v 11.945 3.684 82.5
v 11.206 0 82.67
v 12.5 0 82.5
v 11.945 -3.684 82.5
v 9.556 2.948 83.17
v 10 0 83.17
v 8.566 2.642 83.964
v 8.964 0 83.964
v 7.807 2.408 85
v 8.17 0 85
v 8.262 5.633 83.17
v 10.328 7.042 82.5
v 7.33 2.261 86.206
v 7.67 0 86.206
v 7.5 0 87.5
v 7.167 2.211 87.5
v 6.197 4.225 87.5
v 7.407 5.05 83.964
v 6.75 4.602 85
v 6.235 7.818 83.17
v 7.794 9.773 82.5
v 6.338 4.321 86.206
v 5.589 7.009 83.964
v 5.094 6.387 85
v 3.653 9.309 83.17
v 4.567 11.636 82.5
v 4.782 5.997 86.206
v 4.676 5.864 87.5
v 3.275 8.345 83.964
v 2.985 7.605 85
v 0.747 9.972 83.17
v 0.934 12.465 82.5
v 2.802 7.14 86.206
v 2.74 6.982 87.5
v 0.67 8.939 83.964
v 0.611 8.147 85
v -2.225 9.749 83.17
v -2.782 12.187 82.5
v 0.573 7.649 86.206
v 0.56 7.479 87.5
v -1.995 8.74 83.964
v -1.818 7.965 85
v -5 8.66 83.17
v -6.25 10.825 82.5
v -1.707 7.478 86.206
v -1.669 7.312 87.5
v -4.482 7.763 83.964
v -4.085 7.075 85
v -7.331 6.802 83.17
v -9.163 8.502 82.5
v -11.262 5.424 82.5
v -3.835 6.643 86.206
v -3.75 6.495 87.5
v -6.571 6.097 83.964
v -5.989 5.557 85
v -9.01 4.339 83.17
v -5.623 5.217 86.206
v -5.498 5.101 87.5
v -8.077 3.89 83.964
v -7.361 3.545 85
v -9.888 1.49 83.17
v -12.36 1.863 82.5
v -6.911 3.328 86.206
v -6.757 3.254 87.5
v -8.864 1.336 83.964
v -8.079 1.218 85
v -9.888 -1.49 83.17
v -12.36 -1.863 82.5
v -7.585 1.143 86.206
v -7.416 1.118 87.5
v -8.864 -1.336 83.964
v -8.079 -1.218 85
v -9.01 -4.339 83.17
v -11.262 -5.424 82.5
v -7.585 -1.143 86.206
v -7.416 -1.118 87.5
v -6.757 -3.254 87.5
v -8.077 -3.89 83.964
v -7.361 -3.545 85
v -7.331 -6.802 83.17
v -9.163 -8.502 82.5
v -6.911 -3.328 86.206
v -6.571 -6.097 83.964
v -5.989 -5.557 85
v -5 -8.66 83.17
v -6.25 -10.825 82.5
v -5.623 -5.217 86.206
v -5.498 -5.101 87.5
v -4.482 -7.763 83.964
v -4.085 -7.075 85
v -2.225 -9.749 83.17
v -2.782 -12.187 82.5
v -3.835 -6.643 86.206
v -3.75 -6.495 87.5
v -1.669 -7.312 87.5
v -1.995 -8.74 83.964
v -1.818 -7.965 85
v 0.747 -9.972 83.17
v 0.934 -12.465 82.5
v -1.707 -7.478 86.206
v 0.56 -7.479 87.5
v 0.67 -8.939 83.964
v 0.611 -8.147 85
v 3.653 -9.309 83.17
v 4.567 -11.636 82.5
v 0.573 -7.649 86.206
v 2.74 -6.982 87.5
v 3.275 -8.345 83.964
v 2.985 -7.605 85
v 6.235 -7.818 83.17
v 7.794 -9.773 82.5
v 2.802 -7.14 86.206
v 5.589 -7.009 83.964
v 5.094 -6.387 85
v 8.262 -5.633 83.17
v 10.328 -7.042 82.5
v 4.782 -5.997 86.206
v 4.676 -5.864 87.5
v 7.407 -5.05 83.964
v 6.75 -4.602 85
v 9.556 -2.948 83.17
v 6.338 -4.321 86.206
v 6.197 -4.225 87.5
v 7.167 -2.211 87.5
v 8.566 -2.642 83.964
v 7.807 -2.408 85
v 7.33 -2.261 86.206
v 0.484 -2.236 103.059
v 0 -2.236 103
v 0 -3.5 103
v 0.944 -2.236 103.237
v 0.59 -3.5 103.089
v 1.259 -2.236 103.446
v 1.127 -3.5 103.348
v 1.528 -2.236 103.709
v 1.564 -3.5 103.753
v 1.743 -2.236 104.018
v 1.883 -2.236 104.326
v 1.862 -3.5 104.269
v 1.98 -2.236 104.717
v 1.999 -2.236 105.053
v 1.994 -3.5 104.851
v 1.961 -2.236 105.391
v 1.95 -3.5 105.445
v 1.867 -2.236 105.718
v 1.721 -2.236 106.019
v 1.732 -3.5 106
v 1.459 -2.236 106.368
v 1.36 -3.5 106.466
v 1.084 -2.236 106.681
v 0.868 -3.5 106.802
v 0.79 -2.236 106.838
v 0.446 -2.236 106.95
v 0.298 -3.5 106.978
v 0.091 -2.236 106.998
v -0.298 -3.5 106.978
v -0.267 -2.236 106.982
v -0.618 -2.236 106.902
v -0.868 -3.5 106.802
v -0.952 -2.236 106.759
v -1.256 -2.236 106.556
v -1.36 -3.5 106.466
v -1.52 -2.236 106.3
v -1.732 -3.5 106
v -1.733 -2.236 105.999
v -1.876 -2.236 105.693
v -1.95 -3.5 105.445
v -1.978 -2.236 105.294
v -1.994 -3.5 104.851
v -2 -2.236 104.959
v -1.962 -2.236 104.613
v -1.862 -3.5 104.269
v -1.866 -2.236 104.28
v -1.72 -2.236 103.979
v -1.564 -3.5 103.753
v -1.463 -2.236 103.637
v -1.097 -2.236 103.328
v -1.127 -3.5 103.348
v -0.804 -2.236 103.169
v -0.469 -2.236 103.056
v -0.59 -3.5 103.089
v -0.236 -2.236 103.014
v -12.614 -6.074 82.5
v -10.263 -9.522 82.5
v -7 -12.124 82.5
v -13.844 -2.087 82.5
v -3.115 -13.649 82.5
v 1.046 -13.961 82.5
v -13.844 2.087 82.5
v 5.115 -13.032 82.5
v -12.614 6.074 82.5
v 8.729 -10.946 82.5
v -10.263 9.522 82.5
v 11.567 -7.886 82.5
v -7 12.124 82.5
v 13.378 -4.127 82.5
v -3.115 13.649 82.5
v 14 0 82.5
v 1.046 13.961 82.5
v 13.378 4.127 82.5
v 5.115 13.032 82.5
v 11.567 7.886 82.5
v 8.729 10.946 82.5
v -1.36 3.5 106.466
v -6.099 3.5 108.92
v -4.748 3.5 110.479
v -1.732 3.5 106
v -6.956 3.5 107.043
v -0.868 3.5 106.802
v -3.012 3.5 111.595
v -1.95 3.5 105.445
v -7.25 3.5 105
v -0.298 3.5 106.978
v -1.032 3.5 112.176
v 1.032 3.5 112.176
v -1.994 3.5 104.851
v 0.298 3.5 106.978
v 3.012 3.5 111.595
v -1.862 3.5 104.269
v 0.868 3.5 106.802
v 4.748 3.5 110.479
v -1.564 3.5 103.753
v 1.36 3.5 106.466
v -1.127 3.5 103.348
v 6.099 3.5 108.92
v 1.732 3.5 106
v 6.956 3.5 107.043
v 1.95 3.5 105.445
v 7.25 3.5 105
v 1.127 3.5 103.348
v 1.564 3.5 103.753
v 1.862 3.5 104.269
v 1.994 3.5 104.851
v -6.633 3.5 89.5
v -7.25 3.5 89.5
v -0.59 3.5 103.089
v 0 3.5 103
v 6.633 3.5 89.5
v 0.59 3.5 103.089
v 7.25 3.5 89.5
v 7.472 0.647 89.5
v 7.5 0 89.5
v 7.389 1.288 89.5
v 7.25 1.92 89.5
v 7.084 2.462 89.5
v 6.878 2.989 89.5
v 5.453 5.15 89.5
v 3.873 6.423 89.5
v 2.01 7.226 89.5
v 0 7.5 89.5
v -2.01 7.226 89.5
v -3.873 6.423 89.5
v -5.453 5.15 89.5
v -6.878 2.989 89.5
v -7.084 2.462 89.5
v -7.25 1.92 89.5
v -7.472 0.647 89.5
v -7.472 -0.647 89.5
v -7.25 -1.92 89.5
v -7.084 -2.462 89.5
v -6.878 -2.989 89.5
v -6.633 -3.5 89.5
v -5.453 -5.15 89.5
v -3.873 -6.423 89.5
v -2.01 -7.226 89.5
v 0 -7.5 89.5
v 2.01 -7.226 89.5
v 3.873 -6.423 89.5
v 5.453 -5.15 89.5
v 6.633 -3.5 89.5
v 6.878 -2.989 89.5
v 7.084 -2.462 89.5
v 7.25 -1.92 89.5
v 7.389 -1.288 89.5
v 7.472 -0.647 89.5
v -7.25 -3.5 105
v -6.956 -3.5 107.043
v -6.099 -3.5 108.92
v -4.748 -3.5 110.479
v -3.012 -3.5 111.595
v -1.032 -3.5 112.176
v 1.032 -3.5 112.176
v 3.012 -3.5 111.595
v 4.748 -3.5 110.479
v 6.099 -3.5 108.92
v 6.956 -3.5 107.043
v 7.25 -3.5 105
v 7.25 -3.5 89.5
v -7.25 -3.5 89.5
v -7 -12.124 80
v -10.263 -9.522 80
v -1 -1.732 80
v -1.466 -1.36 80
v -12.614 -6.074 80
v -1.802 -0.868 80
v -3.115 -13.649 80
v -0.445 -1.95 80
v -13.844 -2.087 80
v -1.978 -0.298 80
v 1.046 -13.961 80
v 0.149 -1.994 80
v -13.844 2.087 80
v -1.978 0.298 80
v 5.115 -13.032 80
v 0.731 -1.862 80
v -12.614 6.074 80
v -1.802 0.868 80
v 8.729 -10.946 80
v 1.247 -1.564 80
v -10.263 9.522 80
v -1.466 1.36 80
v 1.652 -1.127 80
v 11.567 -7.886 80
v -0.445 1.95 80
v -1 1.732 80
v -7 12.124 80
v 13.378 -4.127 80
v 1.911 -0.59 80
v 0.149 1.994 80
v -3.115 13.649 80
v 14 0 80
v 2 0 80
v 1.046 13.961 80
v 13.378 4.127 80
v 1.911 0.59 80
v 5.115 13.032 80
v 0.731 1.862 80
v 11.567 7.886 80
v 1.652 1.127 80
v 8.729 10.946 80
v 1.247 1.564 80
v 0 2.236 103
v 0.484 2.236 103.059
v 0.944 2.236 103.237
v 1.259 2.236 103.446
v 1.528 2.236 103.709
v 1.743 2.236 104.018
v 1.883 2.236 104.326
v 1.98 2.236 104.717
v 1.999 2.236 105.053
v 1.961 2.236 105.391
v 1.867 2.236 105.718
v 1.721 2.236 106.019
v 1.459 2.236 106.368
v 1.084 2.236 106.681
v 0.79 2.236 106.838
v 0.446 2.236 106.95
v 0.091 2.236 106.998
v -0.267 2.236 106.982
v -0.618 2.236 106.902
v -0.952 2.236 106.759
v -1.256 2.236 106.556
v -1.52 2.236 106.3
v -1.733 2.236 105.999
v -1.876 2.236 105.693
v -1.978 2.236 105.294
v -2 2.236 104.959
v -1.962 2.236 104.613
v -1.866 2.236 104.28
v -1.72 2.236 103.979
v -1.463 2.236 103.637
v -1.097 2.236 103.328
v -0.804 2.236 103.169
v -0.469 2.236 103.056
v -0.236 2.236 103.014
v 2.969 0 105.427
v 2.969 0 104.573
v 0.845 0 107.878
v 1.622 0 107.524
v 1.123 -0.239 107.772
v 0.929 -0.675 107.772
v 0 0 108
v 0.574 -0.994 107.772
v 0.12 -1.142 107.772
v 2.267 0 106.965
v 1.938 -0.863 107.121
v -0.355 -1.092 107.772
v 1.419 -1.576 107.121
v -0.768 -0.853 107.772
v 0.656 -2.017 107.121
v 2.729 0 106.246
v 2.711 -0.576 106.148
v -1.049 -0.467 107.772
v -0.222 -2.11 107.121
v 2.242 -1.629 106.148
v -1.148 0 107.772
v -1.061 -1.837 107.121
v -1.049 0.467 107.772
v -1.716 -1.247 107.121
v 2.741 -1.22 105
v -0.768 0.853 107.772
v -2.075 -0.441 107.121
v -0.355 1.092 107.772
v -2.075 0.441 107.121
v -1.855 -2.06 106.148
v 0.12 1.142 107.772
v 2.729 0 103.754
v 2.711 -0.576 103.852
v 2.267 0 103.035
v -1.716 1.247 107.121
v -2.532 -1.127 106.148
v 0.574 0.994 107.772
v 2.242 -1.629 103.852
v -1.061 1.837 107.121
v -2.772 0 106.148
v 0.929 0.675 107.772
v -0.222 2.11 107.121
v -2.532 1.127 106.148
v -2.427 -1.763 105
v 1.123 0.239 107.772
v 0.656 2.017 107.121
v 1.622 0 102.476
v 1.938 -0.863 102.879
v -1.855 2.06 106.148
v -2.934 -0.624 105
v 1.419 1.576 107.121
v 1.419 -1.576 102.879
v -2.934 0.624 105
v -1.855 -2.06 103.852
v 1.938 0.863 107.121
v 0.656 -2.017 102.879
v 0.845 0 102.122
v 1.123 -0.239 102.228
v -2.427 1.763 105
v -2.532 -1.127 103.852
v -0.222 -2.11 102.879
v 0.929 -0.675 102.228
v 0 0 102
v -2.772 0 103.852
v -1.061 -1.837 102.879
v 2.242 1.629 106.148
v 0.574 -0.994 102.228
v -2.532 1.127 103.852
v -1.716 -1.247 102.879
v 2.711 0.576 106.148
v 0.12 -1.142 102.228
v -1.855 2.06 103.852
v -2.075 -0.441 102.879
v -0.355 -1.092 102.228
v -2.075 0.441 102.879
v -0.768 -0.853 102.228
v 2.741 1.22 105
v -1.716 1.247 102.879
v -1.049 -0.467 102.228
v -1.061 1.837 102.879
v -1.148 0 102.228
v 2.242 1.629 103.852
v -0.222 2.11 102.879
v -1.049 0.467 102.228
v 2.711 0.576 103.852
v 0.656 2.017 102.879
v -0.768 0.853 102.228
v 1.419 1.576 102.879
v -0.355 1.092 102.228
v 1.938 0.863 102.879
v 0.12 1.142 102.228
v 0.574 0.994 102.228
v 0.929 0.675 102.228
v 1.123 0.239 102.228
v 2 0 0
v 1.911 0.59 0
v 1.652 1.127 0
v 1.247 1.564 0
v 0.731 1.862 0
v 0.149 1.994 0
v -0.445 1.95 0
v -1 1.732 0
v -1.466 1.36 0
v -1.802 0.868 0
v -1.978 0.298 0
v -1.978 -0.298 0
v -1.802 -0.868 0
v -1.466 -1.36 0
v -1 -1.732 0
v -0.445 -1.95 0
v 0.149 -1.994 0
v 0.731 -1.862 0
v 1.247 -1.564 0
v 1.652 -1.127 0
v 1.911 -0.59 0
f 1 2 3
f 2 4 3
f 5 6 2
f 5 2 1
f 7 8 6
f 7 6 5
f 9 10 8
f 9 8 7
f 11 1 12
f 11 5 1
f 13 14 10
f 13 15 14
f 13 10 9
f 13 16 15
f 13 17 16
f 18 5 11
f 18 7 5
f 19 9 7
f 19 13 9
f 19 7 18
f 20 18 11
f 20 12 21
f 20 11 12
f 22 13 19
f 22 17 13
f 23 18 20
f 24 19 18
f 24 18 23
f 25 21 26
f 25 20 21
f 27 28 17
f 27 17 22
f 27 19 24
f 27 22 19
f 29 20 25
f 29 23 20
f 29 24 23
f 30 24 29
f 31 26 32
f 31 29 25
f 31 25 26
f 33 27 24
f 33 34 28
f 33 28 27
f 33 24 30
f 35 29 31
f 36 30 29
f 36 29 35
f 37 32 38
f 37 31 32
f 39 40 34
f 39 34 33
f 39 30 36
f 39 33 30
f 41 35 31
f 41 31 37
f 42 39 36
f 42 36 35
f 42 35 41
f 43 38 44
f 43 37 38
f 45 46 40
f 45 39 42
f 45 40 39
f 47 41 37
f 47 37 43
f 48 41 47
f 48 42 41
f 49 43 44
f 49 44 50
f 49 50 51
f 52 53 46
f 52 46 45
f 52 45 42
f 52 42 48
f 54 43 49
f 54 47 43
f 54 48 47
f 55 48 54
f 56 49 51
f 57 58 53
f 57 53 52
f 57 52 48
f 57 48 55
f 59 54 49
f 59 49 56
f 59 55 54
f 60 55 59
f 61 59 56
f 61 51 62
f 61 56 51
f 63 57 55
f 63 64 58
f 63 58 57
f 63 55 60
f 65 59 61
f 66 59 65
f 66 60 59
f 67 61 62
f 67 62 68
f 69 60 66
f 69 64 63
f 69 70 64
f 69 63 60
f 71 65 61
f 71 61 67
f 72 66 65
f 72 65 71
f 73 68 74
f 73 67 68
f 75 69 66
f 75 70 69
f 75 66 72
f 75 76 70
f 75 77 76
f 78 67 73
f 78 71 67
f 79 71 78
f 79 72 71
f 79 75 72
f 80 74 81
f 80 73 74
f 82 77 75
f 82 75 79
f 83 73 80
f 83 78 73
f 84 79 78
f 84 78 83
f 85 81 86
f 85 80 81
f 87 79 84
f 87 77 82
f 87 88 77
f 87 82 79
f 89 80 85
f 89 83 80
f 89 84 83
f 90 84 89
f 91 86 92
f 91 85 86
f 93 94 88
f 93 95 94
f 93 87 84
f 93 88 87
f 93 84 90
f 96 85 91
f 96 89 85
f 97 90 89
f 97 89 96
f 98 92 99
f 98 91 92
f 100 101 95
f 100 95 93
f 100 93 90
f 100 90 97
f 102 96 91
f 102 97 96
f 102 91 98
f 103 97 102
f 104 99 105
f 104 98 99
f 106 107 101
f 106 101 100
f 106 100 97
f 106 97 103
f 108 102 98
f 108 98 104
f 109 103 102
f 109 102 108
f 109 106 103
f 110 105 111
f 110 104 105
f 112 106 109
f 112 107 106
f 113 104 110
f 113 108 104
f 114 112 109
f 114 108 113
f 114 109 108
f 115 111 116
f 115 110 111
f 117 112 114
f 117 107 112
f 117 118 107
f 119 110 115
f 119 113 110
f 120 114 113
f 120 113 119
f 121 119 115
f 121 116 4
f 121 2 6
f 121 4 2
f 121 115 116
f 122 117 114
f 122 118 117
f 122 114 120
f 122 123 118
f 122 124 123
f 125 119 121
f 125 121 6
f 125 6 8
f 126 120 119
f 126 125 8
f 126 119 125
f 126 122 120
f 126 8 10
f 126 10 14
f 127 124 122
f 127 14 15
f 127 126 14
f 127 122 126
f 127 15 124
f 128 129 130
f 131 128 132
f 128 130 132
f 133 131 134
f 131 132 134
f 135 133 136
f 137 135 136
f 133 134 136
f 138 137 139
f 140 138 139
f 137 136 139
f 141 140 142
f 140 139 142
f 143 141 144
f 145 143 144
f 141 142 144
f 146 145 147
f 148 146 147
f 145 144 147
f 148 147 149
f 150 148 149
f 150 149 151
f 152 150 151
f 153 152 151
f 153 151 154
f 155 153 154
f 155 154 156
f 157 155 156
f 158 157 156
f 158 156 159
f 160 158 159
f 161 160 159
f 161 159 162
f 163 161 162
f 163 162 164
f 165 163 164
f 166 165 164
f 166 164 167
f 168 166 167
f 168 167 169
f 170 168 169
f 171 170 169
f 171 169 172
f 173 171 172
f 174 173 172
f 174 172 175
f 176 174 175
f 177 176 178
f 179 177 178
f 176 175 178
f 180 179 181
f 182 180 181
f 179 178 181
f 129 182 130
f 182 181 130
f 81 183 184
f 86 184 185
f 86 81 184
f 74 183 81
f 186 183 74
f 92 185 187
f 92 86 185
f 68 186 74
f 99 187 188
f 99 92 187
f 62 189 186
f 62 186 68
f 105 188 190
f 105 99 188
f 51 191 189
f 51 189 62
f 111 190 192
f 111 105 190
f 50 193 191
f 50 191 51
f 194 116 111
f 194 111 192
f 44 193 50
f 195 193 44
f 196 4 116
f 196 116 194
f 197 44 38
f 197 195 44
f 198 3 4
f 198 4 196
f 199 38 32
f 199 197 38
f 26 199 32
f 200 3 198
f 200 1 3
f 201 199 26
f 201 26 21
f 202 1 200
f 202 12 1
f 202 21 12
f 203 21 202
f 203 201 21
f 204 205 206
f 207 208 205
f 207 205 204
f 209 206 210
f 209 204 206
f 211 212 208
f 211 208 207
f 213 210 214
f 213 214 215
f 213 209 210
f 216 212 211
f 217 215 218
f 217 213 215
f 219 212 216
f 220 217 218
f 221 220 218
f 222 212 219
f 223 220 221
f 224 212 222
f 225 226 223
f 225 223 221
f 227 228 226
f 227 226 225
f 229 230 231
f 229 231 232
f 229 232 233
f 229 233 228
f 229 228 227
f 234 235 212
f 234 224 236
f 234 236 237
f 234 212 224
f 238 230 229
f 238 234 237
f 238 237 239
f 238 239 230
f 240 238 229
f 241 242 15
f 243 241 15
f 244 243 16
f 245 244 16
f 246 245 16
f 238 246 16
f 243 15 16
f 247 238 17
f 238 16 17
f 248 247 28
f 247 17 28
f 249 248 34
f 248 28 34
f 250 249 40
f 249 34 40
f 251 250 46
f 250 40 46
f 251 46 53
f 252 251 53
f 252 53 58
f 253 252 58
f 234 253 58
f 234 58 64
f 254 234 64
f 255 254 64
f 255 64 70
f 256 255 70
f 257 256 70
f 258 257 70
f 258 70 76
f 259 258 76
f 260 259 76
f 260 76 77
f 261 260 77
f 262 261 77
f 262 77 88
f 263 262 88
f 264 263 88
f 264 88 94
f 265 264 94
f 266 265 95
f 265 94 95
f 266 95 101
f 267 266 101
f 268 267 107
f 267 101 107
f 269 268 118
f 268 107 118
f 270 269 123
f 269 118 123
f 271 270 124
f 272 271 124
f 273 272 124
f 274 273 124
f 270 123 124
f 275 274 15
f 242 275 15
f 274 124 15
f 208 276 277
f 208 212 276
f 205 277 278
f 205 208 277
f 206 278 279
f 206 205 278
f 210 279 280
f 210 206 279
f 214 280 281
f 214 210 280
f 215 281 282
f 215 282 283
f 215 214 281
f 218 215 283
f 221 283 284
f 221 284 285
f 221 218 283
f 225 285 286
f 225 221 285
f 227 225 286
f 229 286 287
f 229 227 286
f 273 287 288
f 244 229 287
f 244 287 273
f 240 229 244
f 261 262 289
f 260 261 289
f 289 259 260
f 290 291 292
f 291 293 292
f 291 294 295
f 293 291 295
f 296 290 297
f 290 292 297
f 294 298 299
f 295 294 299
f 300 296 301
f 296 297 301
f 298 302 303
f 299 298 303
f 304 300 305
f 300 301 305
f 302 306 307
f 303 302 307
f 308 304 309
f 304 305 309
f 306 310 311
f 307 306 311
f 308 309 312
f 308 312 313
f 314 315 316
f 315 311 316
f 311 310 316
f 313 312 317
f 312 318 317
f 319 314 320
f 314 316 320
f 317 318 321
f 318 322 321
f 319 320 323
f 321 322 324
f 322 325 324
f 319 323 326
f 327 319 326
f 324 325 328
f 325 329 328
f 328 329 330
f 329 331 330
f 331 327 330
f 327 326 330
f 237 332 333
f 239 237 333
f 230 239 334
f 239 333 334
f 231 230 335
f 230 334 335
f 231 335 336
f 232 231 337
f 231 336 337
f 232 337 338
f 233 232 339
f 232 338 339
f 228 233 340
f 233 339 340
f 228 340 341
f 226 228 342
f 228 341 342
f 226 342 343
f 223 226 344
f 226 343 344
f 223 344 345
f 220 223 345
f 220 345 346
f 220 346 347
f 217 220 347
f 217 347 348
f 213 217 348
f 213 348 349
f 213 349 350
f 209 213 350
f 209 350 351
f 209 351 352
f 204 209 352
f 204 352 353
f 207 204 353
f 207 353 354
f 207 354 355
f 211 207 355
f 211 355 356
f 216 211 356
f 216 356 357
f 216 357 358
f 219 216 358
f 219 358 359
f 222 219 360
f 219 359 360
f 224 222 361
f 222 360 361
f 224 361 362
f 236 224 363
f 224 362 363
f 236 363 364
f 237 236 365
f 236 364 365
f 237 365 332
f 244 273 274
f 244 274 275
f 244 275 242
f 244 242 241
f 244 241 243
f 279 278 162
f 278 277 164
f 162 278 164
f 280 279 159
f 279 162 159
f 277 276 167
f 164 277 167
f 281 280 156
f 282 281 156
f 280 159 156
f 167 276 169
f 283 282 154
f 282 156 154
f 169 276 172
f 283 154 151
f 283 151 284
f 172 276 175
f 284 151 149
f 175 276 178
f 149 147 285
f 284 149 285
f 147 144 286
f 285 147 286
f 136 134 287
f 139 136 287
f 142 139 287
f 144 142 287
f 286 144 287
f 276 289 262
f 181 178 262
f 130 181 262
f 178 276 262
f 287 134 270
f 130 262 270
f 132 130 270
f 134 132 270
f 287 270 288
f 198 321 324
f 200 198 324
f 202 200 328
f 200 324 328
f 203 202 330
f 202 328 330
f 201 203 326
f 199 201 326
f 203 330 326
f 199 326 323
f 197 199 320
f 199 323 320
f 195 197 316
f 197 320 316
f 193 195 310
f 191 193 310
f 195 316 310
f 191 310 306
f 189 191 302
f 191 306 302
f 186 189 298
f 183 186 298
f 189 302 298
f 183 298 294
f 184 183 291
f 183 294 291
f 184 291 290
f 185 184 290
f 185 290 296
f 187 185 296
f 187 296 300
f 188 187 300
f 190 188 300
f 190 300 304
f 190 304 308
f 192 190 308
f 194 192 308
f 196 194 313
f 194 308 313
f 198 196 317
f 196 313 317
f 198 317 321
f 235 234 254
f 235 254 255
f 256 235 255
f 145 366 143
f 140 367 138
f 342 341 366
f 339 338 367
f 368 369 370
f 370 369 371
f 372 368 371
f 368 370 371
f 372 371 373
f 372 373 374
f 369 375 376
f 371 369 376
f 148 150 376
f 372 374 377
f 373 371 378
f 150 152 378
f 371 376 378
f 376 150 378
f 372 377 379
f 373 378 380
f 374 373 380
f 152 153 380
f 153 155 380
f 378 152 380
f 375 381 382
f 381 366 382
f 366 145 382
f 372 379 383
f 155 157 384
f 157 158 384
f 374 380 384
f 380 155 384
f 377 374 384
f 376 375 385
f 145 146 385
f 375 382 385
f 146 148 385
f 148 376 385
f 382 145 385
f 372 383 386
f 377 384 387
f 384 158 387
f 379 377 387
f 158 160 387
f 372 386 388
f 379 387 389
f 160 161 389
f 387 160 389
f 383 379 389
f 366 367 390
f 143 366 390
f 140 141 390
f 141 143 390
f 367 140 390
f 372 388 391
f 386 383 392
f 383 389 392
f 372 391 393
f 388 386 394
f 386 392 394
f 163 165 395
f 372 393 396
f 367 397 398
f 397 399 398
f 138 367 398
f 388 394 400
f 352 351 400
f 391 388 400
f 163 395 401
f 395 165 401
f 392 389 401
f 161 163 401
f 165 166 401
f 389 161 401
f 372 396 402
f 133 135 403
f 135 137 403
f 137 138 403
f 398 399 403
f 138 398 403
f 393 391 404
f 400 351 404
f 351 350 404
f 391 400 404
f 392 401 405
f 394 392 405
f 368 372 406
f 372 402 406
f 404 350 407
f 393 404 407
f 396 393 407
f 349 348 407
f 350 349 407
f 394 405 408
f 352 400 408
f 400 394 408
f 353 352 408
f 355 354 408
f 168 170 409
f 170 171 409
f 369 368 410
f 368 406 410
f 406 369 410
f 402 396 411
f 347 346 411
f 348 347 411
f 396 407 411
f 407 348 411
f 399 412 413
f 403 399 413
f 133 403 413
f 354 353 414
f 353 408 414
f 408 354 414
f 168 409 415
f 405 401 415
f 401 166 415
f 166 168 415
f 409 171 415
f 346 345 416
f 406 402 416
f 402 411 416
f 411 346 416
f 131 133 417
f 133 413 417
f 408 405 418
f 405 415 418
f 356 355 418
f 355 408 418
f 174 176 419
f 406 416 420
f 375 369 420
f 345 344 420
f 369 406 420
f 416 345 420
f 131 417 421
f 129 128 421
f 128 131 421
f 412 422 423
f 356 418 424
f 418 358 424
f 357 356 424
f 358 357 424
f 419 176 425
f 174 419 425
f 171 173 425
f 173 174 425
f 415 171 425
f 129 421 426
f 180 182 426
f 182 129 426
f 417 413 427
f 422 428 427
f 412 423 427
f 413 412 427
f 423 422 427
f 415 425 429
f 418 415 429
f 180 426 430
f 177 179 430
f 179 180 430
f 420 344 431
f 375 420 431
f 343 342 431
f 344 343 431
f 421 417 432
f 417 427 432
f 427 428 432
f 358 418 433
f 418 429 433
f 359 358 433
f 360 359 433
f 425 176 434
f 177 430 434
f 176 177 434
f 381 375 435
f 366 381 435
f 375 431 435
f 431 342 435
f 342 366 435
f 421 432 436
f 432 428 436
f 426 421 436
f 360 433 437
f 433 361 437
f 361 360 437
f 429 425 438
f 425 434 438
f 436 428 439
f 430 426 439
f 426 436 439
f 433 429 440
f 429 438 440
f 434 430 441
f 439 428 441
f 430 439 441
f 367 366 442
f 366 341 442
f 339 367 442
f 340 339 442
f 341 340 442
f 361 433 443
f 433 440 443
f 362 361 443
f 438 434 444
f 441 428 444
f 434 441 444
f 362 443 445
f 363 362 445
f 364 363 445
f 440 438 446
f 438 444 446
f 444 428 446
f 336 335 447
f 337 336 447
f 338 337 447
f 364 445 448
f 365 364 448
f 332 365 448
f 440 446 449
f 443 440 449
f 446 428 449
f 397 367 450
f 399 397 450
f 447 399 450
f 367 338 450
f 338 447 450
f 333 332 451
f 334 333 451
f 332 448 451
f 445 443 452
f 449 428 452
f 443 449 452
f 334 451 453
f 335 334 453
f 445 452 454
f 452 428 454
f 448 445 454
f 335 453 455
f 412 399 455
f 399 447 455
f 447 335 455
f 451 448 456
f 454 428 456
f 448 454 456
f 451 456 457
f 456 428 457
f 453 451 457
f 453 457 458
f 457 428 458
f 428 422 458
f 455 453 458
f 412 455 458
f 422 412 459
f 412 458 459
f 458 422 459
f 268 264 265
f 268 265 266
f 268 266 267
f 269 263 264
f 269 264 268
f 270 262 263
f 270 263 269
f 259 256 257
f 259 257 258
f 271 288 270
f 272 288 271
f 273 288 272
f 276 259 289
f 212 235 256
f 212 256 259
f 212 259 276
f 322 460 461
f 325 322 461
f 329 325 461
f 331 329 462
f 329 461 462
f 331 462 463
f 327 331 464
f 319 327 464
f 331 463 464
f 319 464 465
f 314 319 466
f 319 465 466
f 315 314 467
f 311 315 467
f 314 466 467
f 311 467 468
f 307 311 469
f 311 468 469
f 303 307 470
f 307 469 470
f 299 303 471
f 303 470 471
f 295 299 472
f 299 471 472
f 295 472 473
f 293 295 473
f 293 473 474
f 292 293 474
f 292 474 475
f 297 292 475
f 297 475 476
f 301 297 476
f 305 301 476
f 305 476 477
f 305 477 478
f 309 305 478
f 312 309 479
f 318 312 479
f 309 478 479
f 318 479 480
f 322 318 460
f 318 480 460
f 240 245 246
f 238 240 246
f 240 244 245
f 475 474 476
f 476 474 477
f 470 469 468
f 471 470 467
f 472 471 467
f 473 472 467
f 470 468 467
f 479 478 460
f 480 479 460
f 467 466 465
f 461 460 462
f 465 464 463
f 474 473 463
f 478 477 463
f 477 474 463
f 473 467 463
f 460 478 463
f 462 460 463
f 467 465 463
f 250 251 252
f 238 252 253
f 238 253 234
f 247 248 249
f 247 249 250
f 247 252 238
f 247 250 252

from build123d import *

# Parameters (mm, degrees)
SKETCH_1_R          = 2
EXTRUDE_1_DEPTH     = 80
SKETCH_2_R          = 14
EXTRUDE_2_DEPTH     = 2.5
SKETCH_3_R          = 7.5
EXTRUDE_3_DEPTH     = 7
FILLET_1_R          = 5
SKETCH_4_R          = 7.25
EXTRUDE_4_DEPTH     = 3.5
SKETCH_5_R          = 2
CUT_EXTRUDE_1_DEPTH = 7


with BuildPart() as part:
    # 草图1 → 凸台-拉伸1 (new body)
    with BuildSketch(Plane.XY):
        Circle(SKETCH_1_R)
    extrude(amount=EXTRUDE_1_DEPTH)

    # 草图2 → 凸台-拉伸2 (add)
    with BuildSketch(Plane.XY.offset(80)):
        Circle(SKETCH_2_R)
    extrude(amount=EXTRUDE_2_DEPTH)

    # 草图3 → 凸台-拉伸3 (add)
    with BuildSketch(Plane.XY.offset(82.5)):
        Circle(SKETCH_3_R)
    extrude(amount=EXTRUDE_3_DEPTH)

    # 圆角1
    fillet_1_edges = [part.edges().sort_by_distance(p)[0] for p in [
        (-7.5, 0, 82.5),
    ]]
    fillet(fillet_1_edges, radius=FILLET_1_R)

    # 草图4 → 凸台-拉伸4 (add, symmetric)
    with BuildSketch(Plane(origin=(0, 0, 0), x_dir=(1, 0, 0), z_dir=(0, 1, 0))):
        with BuildLine():
            ThreePointArc((-7.25, -105), (0, -97.75), (7.25, -105))
            Line((7.25, -105), (7.25, -89.5))
            Line((7.25, -89.5), (-7.25, -89.5))
            Line((-7.25, -89.5), (-7.25, -105))
        make_face()
        with Locations((0, -105)):
            Circle(SKETCH_4_R)
    extrude(amount=EXTRUDE_4_DEPTH, both=True)

    # 草图5 → 切除-拉伸1 (cut)
    with BuildSketch(Plane.XZ.offset(3.5)):
        with Locations(Location((0, 105, 0), (0, 0, 270))):
            Circle(SKETCH_5_R)
    extrude(amount=-CUT_EXTRUDE_1_DEPTH, mode=Mode.SUBTRACT)

    # 草图6 → 切除-旋转1 (revolve, cut)
    with BuildSketch(Plane(origin=(0, 0, 0), x_dir=(1, 0, 0), z_dir=(0, 1, 0))):
        with BuildLine():
            Line((0, -102), (0, -108))
            ThreePointArc((0, -108), (3, -105), (0, -102))
        make_face()
    revolve(axis=Axis((0, 0, 112.25), (0, 0, -1)), mode=Mode.SUBTRACT)


solid = part.part
